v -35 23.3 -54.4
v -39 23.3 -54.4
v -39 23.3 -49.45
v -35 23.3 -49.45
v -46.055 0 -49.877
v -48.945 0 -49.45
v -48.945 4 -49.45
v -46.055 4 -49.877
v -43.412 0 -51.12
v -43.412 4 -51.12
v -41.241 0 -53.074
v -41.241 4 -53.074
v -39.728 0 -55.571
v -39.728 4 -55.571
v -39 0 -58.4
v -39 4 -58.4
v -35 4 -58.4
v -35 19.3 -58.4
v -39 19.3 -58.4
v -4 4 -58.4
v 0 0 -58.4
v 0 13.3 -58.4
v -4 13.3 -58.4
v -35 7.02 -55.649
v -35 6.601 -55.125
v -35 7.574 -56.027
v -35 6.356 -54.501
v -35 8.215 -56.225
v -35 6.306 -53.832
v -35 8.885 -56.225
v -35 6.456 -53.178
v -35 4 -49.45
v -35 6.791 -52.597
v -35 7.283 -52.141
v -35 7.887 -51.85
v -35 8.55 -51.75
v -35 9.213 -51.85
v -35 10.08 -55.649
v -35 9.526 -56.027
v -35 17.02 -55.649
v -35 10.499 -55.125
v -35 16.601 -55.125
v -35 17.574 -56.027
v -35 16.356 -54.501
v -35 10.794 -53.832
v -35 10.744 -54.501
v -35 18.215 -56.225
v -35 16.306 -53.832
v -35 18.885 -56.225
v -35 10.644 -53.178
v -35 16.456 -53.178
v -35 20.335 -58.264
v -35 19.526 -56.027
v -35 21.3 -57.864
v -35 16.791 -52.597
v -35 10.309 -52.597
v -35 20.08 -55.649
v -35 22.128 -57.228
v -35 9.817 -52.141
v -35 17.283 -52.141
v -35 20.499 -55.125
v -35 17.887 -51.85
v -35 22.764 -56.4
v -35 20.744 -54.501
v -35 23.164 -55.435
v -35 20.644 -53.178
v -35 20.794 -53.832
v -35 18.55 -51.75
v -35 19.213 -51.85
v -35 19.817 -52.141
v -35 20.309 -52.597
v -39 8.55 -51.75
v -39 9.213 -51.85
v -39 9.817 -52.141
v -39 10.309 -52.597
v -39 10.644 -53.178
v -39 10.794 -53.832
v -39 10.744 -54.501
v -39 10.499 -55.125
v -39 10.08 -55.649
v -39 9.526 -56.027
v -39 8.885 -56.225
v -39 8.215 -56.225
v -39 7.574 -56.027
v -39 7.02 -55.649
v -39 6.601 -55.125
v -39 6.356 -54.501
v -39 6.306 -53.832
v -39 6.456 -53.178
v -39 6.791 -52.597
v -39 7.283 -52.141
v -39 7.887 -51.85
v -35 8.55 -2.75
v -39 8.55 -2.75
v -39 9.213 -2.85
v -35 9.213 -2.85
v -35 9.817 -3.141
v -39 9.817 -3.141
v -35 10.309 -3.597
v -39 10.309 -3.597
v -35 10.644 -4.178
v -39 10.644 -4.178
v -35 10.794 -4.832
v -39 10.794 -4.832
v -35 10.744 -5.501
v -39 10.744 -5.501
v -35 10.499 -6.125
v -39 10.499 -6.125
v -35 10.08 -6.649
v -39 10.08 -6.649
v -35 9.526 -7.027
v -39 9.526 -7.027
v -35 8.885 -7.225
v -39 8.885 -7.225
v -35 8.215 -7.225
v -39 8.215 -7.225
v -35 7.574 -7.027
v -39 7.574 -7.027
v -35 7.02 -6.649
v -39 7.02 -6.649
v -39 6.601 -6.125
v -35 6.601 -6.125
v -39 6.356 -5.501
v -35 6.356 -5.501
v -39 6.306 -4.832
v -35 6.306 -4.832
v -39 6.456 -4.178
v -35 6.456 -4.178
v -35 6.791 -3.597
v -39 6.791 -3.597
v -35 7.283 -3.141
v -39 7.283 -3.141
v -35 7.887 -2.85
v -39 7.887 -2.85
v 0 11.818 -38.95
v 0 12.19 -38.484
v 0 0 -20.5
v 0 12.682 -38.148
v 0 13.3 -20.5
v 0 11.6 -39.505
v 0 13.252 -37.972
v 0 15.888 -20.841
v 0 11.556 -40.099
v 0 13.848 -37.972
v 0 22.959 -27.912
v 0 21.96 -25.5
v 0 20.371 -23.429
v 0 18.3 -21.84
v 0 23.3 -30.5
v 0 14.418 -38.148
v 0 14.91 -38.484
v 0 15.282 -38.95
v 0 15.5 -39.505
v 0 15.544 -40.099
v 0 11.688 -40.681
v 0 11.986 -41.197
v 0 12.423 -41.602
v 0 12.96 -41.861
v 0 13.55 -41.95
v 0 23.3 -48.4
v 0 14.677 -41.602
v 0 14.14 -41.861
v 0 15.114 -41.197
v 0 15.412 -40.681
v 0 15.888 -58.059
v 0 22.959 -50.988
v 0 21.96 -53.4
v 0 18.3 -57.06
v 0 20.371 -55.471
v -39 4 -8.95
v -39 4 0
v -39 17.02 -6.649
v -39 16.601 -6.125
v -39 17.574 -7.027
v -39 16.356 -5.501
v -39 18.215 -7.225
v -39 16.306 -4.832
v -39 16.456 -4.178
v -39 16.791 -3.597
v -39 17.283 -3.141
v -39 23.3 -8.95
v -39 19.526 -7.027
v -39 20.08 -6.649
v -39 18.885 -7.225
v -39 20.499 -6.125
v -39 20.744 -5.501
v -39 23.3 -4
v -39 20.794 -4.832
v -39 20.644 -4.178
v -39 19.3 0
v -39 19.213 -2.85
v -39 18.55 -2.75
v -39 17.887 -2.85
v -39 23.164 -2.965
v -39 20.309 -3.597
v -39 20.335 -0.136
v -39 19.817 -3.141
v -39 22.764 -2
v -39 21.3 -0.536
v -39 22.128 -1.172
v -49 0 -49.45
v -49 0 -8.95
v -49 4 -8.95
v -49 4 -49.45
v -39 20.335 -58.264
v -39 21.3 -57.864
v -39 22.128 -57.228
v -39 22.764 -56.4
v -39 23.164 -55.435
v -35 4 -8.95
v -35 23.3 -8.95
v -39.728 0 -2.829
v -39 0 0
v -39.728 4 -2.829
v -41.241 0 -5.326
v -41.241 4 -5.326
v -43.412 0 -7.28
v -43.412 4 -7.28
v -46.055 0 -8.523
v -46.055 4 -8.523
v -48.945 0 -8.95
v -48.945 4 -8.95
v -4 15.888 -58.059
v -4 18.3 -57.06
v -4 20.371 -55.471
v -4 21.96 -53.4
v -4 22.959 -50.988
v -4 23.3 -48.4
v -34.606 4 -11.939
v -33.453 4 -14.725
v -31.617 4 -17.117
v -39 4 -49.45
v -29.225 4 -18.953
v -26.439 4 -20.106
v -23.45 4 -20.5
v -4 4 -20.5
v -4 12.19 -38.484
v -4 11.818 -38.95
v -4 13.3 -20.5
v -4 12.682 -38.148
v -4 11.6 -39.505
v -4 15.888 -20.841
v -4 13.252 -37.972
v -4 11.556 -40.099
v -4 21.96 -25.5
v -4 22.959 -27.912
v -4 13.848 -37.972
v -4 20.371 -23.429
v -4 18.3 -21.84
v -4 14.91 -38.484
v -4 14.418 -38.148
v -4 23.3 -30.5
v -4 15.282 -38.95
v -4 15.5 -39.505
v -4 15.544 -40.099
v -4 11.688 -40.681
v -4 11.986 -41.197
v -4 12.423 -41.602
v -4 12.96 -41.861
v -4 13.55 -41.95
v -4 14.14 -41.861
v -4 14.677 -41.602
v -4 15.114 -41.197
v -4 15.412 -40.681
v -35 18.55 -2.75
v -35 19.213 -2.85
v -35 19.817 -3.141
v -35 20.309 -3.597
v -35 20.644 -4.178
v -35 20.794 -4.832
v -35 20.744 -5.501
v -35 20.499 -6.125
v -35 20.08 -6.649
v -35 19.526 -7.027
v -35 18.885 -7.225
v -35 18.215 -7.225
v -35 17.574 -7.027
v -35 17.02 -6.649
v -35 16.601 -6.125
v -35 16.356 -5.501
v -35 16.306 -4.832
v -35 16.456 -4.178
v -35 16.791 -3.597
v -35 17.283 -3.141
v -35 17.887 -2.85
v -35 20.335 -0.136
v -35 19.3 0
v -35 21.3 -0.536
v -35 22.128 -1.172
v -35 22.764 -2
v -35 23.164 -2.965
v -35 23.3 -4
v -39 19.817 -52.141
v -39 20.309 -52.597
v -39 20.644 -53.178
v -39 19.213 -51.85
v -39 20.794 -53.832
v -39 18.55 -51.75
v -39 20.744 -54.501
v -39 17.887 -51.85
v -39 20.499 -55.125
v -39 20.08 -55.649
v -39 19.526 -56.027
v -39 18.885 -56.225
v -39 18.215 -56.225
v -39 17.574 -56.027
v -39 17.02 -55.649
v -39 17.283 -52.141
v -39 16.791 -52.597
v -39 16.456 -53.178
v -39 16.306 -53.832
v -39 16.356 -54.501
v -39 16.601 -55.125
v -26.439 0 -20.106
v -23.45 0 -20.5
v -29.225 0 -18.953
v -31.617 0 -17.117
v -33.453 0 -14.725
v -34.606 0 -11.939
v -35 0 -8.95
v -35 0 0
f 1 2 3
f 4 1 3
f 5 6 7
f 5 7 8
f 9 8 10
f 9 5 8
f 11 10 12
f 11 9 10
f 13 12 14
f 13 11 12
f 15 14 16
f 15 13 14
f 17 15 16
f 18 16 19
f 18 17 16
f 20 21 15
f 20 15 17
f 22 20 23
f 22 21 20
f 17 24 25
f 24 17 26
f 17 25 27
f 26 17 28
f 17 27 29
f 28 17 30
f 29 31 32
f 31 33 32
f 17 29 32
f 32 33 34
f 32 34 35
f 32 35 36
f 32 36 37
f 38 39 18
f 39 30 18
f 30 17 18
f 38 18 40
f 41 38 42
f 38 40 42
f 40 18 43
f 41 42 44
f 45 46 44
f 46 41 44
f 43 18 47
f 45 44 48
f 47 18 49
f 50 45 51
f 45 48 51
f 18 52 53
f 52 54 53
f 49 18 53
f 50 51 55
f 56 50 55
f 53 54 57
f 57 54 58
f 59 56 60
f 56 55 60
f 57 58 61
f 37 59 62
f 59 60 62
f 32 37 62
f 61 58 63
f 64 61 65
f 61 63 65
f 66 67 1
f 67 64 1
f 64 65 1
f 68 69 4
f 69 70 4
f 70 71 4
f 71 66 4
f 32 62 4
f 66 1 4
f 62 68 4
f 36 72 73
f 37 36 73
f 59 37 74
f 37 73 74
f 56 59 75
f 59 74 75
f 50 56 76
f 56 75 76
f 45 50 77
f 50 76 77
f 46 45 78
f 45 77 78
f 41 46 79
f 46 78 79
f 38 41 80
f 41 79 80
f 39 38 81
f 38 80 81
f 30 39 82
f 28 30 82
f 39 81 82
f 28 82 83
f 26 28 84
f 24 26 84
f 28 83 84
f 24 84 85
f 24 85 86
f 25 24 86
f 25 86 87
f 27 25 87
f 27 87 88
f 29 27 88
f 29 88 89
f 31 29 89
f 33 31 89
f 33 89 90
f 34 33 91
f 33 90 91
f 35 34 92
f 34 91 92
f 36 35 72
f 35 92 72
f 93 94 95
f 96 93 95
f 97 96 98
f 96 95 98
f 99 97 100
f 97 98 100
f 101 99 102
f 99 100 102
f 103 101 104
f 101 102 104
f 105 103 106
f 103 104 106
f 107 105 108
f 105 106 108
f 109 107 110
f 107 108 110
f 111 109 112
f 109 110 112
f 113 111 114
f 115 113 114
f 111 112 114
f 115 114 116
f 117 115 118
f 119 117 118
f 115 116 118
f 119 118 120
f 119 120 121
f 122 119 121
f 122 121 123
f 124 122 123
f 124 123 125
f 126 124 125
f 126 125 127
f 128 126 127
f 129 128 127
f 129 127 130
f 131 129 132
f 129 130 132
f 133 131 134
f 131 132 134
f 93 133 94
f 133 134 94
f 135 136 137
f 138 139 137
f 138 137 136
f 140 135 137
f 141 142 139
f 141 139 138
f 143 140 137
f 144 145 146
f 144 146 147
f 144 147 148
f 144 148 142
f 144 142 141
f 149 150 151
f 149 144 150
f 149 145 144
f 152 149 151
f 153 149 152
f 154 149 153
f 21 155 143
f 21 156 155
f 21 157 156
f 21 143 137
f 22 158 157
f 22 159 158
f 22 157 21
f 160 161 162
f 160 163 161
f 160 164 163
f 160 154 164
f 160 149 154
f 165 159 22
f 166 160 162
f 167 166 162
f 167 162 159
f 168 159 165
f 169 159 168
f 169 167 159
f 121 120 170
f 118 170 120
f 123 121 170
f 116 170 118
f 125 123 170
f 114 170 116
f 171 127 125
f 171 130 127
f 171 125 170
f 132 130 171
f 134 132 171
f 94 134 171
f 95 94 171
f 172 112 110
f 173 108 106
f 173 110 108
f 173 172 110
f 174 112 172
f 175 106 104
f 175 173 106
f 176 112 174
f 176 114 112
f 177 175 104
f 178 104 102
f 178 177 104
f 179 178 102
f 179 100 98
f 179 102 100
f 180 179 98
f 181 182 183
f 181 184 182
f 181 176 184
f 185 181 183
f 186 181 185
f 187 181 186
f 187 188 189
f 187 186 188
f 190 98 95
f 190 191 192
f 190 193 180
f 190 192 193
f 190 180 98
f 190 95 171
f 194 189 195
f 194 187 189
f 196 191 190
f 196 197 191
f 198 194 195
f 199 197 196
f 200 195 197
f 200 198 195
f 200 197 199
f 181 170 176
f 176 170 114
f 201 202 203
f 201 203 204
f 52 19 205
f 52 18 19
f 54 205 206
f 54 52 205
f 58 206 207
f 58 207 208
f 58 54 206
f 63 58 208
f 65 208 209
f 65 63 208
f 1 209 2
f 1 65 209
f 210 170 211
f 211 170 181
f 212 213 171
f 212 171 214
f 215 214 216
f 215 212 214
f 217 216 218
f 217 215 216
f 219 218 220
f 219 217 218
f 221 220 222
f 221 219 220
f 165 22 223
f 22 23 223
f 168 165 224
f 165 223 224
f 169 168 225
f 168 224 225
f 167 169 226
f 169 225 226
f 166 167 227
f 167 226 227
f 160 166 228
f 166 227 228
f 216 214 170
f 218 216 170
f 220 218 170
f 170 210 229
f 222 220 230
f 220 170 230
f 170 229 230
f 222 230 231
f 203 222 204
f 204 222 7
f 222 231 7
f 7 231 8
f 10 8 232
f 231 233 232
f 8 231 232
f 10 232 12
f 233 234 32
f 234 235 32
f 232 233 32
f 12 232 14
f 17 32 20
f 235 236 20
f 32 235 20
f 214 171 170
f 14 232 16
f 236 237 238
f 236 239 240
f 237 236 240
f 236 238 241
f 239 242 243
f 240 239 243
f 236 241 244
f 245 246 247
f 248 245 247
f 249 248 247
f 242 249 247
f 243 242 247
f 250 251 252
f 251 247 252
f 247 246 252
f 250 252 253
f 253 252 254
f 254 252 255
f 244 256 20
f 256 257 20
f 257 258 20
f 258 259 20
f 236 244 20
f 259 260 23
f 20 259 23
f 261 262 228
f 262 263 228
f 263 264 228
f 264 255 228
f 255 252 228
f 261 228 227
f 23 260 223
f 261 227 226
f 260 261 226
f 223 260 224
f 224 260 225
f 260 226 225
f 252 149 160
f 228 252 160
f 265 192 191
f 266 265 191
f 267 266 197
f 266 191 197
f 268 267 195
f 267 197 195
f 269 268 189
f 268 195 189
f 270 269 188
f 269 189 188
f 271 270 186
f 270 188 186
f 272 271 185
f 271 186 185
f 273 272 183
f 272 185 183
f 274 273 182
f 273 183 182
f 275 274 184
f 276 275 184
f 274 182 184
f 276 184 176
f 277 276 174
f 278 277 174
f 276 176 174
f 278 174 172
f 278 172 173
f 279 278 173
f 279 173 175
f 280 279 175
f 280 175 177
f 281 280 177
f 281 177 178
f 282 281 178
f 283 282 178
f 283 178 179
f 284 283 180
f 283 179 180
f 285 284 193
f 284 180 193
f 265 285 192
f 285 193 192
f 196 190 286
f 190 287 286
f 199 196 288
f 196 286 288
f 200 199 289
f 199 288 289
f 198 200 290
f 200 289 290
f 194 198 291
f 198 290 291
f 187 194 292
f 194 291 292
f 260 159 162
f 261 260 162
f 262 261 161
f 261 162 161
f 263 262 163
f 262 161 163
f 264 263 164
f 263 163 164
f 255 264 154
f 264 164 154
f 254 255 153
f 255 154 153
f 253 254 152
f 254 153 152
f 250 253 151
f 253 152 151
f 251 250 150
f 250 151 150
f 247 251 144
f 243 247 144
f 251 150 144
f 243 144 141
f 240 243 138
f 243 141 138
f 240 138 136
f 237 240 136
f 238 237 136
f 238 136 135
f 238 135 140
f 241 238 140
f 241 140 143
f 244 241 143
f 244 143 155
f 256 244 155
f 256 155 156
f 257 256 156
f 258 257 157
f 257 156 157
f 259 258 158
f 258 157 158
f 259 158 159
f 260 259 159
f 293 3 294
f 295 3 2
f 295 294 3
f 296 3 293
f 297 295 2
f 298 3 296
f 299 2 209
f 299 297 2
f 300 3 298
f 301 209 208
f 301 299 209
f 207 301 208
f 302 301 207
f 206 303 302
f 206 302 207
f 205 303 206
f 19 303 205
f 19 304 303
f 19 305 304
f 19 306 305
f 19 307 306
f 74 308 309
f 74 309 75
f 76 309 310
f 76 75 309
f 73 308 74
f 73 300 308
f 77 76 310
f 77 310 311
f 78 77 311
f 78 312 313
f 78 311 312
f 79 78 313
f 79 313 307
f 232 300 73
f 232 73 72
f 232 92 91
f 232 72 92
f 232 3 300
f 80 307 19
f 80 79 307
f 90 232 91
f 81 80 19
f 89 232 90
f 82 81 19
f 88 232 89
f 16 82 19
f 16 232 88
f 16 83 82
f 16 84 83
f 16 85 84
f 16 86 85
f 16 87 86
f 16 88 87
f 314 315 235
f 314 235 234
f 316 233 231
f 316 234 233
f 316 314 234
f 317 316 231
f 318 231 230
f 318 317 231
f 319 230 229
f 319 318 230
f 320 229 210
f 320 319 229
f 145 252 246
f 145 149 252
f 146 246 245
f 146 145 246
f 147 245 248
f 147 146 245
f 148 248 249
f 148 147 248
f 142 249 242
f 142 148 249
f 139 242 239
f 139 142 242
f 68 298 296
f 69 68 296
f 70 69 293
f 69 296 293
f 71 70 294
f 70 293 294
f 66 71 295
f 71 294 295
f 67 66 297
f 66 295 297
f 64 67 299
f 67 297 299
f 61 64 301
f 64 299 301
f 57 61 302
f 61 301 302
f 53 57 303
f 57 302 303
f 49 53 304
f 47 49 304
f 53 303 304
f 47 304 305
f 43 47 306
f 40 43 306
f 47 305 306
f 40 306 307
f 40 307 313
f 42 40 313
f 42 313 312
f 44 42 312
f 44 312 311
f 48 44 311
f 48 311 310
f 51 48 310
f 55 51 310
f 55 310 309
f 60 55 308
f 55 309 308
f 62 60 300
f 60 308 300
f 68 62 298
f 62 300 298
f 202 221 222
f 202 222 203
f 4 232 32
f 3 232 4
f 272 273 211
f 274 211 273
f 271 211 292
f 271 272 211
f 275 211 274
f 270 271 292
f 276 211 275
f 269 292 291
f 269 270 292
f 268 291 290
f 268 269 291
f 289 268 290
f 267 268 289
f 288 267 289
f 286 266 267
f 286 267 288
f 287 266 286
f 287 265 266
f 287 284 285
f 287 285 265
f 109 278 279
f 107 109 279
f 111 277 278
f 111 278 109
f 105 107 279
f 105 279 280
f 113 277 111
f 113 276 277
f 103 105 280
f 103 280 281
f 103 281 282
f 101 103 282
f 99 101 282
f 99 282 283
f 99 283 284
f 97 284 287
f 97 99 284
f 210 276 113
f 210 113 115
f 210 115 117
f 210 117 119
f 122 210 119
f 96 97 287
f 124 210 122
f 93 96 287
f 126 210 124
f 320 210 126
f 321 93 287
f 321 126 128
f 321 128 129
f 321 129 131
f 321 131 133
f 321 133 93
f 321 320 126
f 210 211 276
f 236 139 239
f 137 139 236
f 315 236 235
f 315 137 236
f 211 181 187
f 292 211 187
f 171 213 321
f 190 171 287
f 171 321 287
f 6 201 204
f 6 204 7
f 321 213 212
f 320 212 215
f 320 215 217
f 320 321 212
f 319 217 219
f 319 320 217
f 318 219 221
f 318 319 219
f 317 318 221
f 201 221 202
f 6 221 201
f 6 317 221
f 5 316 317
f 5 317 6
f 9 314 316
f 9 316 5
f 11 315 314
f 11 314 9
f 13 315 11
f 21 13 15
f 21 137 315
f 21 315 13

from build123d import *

# Parameters (mm, degrees)
BOSS_EXTRUDE1_DEPTH = 4
SKETCH2_W           = 8.95
SKETCH2_H           = 19.3
SKETCH2_R           = 2.25
BOSS_EXTRUDE2_DEPTH = 4
FILLET1_R           = 10
FILLET2_R           = 4
SKETCH3_W           = 58.4
SKETCH3_H           = 19.3
SKETCH3_R           = 2
BOSS_EXTRUDE3_DEPTH = 4
CUT_EXTRUDE1_REACH  = 81.715
FILLET3_R           = 10


with BuildPart() as part:
    # Sketch1 → Boss-Extrude1 (new body)
    with BuildSketch(Plane(origin=(0, 0, 0), x_dir=(1, 0, 0), z_dir=(0, 1, 0))):
        Polygon((-49, 49.45), (-39, 49.45), (-39, 58.4), (0, 58.4), (0, 0), (-39, 0), (-39, 8.95), (-49, 8.95), align=None)
    extrude(amount=BOSS_EXTRUDE1_DEPTH)

    # Sketch2 → Boss-Extrude2 (add)
    # profile 1 of 2: a face of its own
    with BuildSketch(Plane.ZY.offset(39)):
        with Locations((-4.475, 13.65)):
            Rectangle(SKETCH2_W, SKETCH2_H)
        with Locations((-5, 18.55)):
            Circle(SKETCH2_R, mode=Mode.SUBTRACT)
        with Locations((-5, 8.55)):
            Circle(SKETCH2_R, mode=Mode.SUBTRACT)
    # profile 2 of 2: a face of its own
    with BuildSketch(Plane.ZY.offset(39)):
        with Locations((-53.925, 13.65)):
            Rectangle(SKETCH2_W, SKETCH2_H)
        with Locations((-54, 18.55)):
            Circle(SKETCH2_R, mode=Mode.SUBTRACT)
        with Locations((-54, 8.55)):
            Circle(SKETCH2_R, mode=Mode.SUBTRACT)
    extrude(amount=-BOSS_EXTRUDE2_DEPTH)

    # Fillet1
    # the kernel refuses this fillet: 10 mm, written as the material it adds along each edge
    with BuildSketch(Plane(origin=(-39, 0, -49.45), x_dir=(-1, 0, 0), z_dir=(0, 1, 0))) as fillet1_piece_1:
        with BuildLine():
            CenterArc((9.944722218, -10), FILLET1_R, 90, 83.97283344)
            Line((0, -8.95), (0, 0))
            Line((0, 0), (9.944722218, 0))
        make_face()
    extrude(amount=4)
    with BuildSketch(Plane(origin=(-39, 0, -8.95), x_dir=(0, 0, 1), z_dir=(0, 1, 0))) as fillet1_piece_2:
        with BuildLine():
            CenterArc((10, -9.944722218), FILLET1_R, 96.02716656, 83.97283344)
            Line((0, -9.944722218), (0, 0))
            Line((0, 0), (8.95, 0))
        make_face()
    extrude(amount=4)

    # Fillet2
    fillet2_edges = [part.edges().sort_by_distance(p)[0] for p in [
        (-37, 23.3, 0),
        (-37, 23.3, -58.4),
    ]]
    fillet(fillet2_edges, radius=FILLET2_R)

    # Sketch3 → Boss-Extrude3 (add)
    with BuildSketch(Plane(origin=(0, 0, 0), x_dir=(0, 0, -1), z_dir=(1, 0, 0))):
        with Locations((29.2, 13.65)):
            Rectangle(SKETCH3_W, SKETCH3_H)
        with Locations((39.95, 13.55)):
            Circle(SKETCH3_R, mode=Mode.SUBTRACT)
    extrude(amount=-BOSS_EXTRUDE3_DEPTH)

    # Sketch4 → Cut-Extrude1 (cut, up to next)
    with BuildSketch(Plane.XZ, mode=Mode.PRIVATE) as cut_extrude1_sk1:
        with BuildLine():
            Line((0, 0), (0, -20.5))
            Line((0, -20.5), (-23.45, -20.5))
            ThreePointArc((-23.45, -20.5), (-31.617083323, -17.117083323), (-35, -8.95))
            Line((-35, -8.95), (-35, 0))
            Line((-35, 0), (0, 0))
        make_face()
    cut_extrude1_tool1 = extrude(cut_extrude1_sk1.sketch, amount=-CUT_EXTRUDE1_REACH, mode=Mode.PRIVATE) & part.part
    add(cut_extrude1_tool1.solids().sort_by_distance((-16.879944, 0, -9.931243))[0], mode=Mode.SUBTRACT)

    # Fillet3
    fillet3_edges = [part.edges().sort_by_distance(p)[0] for p in [
        (-2, 23.3, -20.5),
        (-2, 23.3, -58.4),
    ]]
    fillet(fillet3_edges, radius=FILLET3_R)


solid = part.part
